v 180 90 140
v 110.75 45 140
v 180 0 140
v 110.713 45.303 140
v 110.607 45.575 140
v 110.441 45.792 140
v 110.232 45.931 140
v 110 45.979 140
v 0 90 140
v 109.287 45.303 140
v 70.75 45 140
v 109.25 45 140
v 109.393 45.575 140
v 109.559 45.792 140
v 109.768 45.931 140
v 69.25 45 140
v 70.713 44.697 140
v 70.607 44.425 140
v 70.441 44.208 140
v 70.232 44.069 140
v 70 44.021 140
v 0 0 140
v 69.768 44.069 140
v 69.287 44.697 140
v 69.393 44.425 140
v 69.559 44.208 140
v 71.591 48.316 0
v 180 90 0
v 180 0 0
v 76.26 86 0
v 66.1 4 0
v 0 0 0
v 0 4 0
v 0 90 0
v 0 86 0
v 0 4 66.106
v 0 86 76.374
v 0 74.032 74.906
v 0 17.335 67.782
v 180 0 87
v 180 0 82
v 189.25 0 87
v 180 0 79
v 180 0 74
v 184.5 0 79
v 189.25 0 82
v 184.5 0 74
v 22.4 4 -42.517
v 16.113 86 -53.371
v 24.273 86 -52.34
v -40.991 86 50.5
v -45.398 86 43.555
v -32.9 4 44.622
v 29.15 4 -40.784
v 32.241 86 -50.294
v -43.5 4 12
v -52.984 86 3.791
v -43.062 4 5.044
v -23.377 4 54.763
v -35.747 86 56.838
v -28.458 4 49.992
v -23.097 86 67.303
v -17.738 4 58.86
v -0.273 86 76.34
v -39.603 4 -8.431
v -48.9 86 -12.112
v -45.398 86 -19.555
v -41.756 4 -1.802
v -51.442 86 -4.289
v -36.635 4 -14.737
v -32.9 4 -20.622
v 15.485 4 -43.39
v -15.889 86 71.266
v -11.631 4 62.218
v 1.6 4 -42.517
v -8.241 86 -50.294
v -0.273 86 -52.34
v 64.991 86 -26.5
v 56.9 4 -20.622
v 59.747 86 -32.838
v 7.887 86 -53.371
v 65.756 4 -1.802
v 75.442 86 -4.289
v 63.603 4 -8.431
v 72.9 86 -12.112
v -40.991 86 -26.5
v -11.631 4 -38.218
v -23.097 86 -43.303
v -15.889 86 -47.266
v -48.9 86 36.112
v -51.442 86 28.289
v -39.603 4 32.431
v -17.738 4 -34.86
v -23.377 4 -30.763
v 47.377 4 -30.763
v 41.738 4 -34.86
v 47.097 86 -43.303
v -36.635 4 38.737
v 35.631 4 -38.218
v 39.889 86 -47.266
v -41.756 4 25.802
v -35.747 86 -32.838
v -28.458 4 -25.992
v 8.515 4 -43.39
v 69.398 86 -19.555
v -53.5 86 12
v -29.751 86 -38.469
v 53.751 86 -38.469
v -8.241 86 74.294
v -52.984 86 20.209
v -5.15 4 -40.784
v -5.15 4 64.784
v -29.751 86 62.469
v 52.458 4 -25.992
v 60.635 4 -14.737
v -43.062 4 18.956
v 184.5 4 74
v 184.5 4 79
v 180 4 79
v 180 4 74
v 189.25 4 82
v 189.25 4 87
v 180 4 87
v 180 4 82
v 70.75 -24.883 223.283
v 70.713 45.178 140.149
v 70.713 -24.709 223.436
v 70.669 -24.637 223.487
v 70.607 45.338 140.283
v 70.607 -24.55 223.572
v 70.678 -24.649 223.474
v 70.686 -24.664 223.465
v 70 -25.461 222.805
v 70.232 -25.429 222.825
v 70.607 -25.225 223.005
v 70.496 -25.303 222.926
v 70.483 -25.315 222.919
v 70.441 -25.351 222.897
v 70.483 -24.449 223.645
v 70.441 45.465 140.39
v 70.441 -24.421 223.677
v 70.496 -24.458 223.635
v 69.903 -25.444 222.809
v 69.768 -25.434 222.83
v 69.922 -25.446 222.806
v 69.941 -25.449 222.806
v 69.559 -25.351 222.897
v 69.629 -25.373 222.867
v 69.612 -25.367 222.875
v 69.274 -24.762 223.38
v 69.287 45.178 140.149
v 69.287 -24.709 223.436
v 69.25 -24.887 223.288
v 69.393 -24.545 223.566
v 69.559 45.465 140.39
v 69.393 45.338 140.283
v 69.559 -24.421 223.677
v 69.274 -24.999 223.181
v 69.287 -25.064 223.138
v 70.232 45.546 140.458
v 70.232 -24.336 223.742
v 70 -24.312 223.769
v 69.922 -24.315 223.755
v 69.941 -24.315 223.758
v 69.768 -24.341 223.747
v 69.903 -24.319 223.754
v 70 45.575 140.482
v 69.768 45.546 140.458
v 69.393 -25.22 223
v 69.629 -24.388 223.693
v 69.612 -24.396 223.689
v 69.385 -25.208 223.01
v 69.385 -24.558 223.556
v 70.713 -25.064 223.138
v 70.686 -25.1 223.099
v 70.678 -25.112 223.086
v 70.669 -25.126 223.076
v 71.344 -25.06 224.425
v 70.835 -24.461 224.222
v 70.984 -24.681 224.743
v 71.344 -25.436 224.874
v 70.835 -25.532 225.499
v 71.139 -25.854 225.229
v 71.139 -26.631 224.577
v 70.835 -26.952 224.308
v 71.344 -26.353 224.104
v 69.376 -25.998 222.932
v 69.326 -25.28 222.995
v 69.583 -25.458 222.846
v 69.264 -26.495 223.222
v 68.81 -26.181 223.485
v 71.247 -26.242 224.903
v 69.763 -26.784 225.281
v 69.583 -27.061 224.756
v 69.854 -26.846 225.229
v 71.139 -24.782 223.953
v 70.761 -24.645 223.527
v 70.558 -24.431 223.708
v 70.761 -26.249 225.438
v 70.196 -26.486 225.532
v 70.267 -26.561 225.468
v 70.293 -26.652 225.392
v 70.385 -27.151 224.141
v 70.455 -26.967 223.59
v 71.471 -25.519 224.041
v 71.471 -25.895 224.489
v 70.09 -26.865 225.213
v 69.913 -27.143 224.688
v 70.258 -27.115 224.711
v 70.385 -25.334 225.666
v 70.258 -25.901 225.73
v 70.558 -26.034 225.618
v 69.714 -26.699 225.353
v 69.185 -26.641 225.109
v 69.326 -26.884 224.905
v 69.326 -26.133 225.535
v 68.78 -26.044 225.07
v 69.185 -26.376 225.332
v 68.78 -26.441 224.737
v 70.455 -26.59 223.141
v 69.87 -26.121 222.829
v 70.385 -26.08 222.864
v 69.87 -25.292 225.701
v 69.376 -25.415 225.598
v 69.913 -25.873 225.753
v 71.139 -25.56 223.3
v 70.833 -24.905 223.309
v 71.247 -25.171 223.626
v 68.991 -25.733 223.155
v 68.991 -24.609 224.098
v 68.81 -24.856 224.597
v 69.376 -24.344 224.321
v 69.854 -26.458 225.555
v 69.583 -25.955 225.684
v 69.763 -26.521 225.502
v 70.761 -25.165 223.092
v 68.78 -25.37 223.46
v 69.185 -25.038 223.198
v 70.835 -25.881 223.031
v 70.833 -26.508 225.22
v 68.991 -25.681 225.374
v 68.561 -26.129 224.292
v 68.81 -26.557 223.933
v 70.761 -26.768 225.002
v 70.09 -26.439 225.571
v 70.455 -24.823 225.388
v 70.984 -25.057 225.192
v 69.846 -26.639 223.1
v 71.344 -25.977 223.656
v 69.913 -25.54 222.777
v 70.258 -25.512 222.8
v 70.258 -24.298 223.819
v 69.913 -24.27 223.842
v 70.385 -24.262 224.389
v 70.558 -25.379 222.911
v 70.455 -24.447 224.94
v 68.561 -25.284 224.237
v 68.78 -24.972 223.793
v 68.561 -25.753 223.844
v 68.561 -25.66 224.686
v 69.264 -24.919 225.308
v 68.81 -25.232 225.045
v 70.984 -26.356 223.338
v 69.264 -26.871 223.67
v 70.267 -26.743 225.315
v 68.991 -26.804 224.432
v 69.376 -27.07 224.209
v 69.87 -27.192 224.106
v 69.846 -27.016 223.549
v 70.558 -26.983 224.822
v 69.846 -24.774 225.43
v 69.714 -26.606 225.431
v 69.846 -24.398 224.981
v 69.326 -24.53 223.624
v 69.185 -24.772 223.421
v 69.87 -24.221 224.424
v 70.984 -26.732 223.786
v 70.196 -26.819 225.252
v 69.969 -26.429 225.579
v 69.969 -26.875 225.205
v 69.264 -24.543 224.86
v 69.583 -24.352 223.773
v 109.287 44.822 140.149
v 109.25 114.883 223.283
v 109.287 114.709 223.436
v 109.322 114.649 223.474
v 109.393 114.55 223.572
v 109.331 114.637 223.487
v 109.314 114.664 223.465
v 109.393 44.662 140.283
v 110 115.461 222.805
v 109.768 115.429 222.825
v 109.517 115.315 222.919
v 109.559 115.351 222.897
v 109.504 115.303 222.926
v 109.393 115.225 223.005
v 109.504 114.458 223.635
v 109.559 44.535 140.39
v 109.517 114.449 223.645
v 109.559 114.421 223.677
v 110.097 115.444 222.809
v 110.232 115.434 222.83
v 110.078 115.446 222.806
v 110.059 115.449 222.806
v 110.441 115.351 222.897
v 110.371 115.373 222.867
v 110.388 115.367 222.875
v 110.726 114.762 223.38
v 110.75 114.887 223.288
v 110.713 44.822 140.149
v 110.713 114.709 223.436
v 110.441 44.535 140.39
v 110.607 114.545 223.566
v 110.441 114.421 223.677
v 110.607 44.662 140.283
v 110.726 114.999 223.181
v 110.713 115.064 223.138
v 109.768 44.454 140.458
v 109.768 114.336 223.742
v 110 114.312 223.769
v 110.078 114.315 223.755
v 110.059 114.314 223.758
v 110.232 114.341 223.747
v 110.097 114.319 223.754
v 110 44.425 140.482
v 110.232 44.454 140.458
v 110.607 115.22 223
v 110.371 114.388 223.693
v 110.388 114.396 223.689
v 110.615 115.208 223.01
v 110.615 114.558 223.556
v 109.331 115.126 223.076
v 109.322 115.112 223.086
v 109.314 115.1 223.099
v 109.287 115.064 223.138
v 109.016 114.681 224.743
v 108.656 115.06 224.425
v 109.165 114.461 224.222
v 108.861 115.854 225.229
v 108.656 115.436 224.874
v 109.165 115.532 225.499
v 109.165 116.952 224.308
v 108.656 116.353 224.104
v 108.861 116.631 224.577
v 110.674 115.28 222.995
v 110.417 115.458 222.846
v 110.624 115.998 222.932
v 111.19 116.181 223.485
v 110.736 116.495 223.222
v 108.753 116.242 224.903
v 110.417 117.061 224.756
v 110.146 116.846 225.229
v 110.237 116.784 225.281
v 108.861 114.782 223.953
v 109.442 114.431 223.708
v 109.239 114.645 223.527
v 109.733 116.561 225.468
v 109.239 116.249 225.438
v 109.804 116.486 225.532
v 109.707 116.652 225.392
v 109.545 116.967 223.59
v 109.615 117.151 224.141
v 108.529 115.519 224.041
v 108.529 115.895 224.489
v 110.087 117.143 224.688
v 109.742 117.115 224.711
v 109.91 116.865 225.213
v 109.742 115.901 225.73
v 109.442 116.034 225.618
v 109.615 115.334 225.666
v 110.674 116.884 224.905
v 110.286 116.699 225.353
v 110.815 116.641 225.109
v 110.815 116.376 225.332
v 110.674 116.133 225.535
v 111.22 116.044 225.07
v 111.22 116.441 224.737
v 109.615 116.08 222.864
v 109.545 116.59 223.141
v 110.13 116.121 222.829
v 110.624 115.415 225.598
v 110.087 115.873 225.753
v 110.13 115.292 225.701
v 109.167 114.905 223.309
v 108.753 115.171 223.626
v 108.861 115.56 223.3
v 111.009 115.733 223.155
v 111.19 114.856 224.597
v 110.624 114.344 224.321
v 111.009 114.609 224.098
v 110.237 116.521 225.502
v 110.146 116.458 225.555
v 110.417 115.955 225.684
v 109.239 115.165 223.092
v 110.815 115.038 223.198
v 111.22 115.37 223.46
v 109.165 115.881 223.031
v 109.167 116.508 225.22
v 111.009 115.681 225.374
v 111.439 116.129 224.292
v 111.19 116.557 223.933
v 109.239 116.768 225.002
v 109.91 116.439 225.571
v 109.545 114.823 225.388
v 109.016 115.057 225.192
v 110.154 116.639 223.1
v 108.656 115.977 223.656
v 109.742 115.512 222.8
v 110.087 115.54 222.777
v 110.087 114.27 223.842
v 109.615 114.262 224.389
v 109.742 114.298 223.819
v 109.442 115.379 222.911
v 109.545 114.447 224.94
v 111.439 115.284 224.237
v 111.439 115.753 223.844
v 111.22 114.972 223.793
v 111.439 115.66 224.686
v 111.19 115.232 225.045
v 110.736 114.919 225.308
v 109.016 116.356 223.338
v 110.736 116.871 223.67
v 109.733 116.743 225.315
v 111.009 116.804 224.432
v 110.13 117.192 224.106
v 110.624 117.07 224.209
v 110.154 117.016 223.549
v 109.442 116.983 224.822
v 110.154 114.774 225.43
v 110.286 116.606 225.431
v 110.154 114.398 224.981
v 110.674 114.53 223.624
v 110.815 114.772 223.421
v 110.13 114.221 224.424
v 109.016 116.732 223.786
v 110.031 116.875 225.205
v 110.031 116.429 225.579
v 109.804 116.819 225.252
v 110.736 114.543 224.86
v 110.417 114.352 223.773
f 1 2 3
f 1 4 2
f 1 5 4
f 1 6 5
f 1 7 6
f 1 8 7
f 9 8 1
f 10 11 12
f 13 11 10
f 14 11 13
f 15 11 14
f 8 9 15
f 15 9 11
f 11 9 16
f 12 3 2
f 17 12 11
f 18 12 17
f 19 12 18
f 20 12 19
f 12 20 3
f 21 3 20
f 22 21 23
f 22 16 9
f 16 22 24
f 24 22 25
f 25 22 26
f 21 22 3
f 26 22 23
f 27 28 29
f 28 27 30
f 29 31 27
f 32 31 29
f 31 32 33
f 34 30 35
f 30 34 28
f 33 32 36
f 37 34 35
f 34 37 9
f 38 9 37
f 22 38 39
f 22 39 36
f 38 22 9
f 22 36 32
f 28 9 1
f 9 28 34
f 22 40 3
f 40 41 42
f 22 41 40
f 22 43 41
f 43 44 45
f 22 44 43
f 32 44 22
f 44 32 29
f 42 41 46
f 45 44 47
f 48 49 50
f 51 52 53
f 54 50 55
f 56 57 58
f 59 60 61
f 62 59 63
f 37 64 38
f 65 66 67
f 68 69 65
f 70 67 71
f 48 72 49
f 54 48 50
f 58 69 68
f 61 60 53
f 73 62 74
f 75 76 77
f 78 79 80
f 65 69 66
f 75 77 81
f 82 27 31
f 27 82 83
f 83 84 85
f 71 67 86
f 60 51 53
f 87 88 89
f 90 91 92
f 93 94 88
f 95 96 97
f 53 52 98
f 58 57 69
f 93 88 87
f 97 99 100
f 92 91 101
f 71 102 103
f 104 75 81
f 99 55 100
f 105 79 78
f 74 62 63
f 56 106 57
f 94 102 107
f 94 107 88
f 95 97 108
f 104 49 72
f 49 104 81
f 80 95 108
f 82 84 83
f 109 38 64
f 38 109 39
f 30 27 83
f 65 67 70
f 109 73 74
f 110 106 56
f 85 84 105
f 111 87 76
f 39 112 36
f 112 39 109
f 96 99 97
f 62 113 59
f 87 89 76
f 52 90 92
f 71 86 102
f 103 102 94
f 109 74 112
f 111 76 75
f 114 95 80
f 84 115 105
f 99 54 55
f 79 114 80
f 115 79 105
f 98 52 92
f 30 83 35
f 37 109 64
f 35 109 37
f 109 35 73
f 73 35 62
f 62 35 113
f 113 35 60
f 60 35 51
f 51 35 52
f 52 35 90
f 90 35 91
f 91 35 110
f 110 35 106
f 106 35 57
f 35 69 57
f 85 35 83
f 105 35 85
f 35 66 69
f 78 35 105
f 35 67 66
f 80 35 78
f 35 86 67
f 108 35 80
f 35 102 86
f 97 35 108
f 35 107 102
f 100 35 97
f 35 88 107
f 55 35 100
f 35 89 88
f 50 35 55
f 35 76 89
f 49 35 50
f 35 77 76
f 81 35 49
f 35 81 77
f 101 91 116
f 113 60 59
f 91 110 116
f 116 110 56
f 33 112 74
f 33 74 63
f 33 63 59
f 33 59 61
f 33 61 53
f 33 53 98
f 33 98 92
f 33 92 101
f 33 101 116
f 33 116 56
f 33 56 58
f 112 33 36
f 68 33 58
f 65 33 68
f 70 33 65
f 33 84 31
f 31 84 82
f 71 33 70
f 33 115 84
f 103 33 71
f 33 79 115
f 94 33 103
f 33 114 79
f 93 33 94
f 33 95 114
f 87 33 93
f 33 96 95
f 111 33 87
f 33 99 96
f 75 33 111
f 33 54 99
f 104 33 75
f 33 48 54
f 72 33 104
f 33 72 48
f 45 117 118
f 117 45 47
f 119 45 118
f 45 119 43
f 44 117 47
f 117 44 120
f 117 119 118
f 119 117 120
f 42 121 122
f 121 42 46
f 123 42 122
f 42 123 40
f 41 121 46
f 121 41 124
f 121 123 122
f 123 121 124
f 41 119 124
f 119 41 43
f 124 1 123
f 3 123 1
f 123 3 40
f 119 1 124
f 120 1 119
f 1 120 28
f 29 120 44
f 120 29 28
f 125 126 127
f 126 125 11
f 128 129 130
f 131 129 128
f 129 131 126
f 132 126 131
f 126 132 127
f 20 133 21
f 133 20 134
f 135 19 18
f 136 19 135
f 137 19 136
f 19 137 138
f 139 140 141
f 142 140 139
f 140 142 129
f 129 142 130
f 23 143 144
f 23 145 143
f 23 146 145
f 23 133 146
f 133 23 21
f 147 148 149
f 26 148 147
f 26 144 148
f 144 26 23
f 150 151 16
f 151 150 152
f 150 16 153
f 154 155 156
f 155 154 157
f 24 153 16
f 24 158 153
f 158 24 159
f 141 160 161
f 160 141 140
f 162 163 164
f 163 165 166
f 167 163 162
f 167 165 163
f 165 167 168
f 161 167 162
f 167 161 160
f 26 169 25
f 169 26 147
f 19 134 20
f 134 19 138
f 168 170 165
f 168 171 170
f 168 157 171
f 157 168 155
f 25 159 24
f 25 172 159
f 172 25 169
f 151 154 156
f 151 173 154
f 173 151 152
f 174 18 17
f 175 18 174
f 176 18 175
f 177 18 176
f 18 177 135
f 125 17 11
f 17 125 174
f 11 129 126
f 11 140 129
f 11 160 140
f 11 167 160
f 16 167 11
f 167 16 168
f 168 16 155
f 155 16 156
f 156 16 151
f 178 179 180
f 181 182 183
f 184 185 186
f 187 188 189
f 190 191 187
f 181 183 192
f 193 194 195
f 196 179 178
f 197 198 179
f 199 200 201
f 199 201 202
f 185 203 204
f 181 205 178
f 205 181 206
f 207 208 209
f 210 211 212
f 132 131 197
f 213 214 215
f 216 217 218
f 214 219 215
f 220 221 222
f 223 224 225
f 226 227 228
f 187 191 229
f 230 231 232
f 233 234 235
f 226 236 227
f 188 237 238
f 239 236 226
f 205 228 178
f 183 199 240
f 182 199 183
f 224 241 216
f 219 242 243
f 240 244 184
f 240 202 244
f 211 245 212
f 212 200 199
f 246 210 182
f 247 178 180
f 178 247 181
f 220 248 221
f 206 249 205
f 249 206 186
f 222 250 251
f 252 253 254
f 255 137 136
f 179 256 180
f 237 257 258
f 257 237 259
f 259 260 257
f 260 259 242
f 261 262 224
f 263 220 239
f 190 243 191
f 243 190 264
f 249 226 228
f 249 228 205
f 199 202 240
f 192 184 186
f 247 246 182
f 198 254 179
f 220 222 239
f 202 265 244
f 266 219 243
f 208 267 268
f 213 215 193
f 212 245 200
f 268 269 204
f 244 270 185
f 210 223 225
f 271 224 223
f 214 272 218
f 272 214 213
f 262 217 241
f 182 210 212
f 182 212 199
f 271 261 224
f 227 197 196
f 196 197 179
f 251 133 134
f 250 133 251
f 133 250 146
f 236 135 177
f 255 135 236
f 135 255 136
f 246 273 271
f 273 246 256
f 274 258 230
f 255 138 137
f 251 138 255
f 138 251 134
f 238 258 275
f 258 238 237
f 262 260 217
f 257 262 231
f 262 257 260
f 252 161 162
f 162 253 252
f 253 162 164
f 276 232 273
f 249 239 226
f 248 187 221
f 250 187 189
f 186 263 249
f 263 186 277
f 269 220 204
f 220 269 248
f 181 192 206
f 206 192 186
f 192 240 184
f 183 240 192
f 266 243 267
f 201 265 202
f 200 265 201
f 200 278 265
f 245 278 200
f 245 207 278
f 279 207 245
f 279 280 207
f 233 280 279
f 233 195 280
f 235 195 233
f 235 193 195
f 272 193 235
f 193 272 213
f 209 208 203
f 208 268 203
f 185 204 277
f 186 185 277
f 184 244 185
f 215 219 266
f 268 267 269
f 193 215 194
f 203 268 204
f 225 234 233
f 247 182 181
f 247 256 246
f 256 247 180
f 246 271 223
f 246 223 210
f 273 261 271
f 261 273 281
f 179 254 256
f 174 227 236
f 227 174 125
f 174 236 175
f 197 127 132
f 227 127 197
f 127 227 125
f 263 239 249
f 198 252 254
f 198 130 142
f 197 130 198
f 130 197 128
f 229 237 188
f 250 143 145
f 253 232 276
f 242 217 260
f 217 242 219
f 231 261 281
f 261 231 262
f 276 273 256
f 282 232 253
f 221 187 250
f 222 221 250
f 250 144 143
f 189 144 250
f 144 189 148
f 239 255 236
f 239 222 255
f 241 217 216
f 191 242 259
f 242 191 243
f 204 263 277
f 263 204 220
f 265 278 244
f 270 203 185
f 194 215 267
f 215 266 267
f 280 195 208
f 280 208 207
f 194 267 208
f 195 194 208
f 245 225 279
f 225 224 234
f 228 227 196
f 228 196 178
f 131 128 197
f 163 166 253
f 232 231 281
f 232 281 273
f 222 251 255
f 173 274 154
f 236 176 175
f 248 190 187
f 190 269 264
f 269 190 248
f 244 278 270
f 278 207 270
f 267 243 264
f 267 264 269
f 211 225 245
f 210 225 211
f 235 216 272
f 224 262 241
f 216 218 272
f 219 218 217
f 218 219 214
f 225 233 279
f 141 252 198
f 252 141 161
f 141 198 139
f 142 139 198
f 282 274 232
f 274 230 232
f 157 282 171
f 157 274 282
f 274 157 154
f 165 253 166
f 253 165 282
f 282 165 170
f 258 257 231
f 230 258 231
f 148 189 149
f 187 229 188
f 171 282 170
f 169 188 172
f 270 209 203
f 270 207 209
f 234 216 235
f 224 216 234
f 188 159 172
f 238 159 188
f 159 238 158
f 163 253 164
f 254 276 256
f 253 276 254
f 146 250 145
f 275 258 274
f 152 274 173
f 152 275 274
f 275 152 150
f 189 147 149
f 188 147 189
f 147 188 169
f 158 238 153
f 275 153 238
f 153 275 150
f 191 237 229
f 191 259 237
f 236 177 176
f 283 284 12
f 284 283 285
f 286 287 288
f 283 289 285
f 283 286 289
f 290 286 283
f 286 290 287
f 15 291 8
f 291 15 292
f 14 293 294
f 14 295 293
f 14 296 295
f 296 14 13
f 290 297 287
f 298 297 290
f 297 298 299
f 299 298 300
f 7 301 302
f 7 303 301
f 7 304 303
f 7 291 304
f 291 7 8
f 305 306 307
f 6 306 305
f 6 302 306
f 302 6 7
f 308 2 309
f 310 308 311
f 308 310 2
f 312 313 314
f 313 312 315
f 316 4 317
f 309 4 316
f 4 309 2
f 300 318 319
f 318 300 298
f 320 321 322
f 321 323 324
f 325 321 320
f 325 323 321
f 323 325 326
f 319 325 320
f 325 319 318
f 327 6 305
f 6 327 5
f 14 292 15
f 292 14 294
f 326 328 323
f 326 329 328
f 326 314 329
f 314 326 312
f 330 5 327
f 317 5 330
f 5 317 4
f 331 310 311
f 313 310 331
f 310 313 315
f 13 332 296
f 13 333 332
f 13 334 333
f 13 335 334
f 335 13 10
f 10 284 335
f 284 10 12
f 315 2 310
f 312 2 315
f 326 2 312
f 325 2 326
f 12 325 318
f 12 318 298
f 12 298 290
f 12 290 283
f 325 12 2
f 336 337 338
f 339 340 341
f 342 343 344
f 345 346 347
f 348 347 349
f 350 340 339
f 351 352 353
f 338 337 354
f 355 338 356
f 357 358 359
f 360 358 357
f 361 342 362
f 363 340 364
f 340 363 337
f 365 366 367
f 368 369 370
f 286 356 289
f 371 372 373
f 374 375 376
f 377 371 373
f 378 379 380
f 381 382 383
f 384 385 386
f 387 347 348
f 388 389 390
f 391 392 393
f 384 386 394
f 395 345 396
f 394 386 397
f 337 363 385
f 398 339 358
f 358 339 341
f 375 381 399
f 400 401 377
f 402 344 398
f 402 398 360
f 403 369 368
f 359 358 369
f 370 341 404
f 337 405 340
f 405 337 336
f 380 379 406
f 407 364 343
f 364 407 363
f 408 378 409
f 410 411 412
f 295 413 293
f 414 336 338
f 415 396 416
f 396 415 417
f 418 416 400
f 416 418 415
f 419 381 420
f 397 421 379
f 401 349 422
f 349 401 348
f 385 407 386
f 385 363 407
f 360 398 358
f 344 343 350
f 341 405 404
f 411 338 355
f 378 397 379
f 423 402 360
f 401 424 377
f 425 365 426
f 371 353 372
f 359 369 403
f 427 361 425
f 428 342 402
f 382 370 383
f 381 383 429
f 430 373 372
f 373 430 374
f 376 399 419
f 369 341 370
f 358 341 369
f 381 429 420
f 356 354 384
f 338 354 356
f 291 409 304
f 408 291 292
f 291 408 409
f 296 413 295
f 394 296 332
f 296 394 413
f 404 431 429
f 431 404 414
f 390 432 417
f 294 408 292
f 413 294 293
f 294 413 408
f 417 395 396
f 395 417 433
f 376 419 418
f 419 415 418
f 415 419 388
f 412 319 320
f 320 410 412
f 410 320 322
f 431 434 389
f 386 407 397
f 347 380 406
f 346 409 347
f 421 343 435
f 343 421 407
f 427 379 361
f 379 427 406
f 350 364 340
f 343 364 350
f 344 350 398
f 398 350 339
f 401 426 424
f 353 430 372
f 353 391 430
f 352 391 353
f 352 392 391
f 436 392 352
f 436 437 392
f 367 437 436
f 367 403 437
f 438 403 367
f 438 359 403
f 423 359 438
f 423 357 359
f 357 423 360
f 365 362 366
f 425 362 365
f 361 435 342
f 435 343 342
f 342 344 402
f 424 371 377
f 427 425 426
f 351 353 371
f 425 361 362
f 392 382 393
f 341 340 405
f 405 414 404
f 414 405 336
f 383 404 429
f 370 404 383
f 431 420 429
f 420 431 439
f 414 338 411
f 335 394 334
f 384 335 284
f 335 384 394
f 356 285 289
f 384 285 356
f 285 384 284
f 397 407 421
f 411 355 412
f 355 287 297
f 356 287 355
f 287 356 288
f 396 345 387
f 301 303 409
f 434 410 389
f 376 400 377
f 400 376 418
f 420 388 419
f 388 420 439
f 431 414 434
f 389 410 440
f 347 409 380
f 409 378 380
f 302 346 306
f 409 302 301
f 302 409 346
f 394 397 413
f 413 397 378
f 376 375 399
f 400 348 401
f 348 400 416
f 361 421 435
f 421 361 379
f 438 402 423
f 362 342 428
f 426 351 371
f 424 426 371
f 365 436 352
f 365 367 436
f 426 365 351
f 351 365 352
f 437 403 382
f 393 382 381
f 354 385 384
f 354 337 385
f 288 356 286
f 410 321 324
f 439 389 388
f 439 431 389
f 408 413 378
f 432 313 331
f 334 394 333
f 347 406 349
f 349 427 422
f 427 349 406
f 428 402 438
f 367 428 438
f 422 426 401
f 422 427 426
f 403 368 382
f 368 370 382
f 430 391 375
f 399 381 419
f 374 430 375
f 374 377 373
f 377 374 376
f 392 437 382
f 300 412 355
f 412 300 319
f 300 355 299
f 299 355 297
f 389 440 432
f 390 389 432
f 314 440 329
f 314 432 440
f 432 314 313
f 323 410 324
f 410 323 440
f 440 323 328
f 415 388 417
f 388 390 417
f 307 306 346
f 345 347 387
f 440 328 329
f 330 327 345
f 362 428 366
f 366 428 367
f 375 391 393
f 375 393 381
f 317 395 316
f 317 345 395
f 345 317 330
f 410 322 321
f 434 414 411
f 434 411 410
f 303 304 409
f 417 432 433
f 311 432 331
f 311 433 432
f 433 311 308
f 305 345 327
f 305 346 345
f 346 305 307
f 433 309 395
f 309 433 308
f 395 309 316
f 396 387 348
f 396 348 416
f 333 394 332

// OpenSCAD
// Vintage CRT TV OpenSCAD Model
// All dimensions in millimeters

// --- Parameters ---
// Main TV Dimensions
tv_width = 180;          // Front width of the television
tv_height = 140;         // Total height of the TV
tv_depth = 90;           // Depth from front to back

// Screen & Bezel
bezel_thickness = 8;     // Width of the raised bezel around the screen
screen_inset = 4;        // Depth the screen is recessed from the bezel

// Control Panel (Right Side)
control_panel_width = 25; // Width of the right-hand control panel
speaker_height = 50;     // Height of the speaker grille area
button_count = 4;        // Number of control buttons above speaker
button_size = 5;         // Size of each control button

// Antennas
antenna_length = 110;    // Length of each antenna rod
antenna_diameter = 1.5;  // Diameter of antenna rods
antenna_tip_diameter = 3;// Diameter of antenna end caps
antenna_angle = 40;      // Angle of antennas from vertical (degrees)
antenna_spacing = 40;    // Distance between the two antennas on top

// Back Housing (Rear Section)
back_housing_width = 60; // Width of the rear housing
back_housing_depth = 20; // Depth of the rear housing
back_housing_height = 110;// Height of the rear housing

// --- Helper Modules ---
// Single antenna with tip
module single_antenna() {
    color("silver", 0.9)
        cylinder(h=antenna_length, d=antenna_diameter, center=false, $fn=20);
    color("black")
        translate([0, 0, antenna_length])
            sphere(d=antenna_tip_diameter, $fn=15);
}

// Control panel with buttons and speaker
module control_panel() {
    // Base control panel
    color("gray")
        translate([tv_width - control_panel_width, 0, 0])
            cube([control_panel_width, tv_depth, tv_height], center=false);
    
    // Speaker grille (dark inset area)
    color("black")
        translate([tv_width - control_panel_width + 2, 0, 2])
            cube([control_panel_width - 4, tv_depth, speaker_height], center=false);
    
    // Control buttons (above speaker)
    for (i = [0 : button_count-1]) {
        color("lightgray")
            translate([tv_width - control_panel_width + 3 + i*(control_panel_width - 6)/button_count, 
                       0, 
                       speaker_height + 8 + i*(button_size + 3)])
                cube([control_panel_width - 8, 4, button_size], center=false);
    }
}

// Screen and bezel assembly
module screen_assembly() {
    // Raised bezel frame
    color("gray")
        difference() {
            cube([tv_width - control_panel_width, tv_depth, tv_height], center=false);
            // Cut out the inner screen area
            translate([bezel_thickness, -1, bezel_thickness])
                cube([tv_width - control_panel_width - bezel_thickness*2, 
                      tv_depth + 2, 
                      tv_height - bezel_thickness*2], center=false);
        }
    
    // Recessed CRT screen (slightly tapered for realism)
    color("darkgray", 0.8)
        translate([bezel_thickness + screen_inset, 
                   tv_depth/2, 
                   bezel_thickness + screen_inset])
            rotate([90, 0, 0])
                cylinder(h=tv_depth - screen_inset*2, 
                         r1=(tv_width - control_panel_width - bezel_thickness*2 - screen_inset*2)/2,
                         r2=(tv_width - control_panel_width - bezel_thickness*2 - screen_inset*2)/2 - 10,
                         center=true, $fn=50);
}

// --- Main Assembly ---
module vintage_tv() {
    union() {
        // Main outer cabinet
        color("gray")
            cube([tv_width, tv_depth, tv_height], center=false);
        
        // Screen and bezel (left side)
        screen_assembly();
        
        // Control panel (right side)
        control_panel();
        
        // Rear housing (back section)
        color("gray")
            translate([tv_width/2 - back_housing_width/2, 
                       tv_depth - back_housing_depth, 
                       0])
                cube([back_housing_width, back_housing_depth, back_housing_height], center=false);
        
        // Antennas on top
        translate([tv_width/2 - antenna_spacing/2, tv_depth/2, tv_height])
            rotate([antenna_angle, 0, 0])
                single_antenna();
        translate([tv_width/2 + antenna_spacing/2, tv_depth/2, tv_height])
            rotate([antenna_angle, 0, 180])
                single_antenna();
    }
}

// Render the complete model
vintage_tv();
